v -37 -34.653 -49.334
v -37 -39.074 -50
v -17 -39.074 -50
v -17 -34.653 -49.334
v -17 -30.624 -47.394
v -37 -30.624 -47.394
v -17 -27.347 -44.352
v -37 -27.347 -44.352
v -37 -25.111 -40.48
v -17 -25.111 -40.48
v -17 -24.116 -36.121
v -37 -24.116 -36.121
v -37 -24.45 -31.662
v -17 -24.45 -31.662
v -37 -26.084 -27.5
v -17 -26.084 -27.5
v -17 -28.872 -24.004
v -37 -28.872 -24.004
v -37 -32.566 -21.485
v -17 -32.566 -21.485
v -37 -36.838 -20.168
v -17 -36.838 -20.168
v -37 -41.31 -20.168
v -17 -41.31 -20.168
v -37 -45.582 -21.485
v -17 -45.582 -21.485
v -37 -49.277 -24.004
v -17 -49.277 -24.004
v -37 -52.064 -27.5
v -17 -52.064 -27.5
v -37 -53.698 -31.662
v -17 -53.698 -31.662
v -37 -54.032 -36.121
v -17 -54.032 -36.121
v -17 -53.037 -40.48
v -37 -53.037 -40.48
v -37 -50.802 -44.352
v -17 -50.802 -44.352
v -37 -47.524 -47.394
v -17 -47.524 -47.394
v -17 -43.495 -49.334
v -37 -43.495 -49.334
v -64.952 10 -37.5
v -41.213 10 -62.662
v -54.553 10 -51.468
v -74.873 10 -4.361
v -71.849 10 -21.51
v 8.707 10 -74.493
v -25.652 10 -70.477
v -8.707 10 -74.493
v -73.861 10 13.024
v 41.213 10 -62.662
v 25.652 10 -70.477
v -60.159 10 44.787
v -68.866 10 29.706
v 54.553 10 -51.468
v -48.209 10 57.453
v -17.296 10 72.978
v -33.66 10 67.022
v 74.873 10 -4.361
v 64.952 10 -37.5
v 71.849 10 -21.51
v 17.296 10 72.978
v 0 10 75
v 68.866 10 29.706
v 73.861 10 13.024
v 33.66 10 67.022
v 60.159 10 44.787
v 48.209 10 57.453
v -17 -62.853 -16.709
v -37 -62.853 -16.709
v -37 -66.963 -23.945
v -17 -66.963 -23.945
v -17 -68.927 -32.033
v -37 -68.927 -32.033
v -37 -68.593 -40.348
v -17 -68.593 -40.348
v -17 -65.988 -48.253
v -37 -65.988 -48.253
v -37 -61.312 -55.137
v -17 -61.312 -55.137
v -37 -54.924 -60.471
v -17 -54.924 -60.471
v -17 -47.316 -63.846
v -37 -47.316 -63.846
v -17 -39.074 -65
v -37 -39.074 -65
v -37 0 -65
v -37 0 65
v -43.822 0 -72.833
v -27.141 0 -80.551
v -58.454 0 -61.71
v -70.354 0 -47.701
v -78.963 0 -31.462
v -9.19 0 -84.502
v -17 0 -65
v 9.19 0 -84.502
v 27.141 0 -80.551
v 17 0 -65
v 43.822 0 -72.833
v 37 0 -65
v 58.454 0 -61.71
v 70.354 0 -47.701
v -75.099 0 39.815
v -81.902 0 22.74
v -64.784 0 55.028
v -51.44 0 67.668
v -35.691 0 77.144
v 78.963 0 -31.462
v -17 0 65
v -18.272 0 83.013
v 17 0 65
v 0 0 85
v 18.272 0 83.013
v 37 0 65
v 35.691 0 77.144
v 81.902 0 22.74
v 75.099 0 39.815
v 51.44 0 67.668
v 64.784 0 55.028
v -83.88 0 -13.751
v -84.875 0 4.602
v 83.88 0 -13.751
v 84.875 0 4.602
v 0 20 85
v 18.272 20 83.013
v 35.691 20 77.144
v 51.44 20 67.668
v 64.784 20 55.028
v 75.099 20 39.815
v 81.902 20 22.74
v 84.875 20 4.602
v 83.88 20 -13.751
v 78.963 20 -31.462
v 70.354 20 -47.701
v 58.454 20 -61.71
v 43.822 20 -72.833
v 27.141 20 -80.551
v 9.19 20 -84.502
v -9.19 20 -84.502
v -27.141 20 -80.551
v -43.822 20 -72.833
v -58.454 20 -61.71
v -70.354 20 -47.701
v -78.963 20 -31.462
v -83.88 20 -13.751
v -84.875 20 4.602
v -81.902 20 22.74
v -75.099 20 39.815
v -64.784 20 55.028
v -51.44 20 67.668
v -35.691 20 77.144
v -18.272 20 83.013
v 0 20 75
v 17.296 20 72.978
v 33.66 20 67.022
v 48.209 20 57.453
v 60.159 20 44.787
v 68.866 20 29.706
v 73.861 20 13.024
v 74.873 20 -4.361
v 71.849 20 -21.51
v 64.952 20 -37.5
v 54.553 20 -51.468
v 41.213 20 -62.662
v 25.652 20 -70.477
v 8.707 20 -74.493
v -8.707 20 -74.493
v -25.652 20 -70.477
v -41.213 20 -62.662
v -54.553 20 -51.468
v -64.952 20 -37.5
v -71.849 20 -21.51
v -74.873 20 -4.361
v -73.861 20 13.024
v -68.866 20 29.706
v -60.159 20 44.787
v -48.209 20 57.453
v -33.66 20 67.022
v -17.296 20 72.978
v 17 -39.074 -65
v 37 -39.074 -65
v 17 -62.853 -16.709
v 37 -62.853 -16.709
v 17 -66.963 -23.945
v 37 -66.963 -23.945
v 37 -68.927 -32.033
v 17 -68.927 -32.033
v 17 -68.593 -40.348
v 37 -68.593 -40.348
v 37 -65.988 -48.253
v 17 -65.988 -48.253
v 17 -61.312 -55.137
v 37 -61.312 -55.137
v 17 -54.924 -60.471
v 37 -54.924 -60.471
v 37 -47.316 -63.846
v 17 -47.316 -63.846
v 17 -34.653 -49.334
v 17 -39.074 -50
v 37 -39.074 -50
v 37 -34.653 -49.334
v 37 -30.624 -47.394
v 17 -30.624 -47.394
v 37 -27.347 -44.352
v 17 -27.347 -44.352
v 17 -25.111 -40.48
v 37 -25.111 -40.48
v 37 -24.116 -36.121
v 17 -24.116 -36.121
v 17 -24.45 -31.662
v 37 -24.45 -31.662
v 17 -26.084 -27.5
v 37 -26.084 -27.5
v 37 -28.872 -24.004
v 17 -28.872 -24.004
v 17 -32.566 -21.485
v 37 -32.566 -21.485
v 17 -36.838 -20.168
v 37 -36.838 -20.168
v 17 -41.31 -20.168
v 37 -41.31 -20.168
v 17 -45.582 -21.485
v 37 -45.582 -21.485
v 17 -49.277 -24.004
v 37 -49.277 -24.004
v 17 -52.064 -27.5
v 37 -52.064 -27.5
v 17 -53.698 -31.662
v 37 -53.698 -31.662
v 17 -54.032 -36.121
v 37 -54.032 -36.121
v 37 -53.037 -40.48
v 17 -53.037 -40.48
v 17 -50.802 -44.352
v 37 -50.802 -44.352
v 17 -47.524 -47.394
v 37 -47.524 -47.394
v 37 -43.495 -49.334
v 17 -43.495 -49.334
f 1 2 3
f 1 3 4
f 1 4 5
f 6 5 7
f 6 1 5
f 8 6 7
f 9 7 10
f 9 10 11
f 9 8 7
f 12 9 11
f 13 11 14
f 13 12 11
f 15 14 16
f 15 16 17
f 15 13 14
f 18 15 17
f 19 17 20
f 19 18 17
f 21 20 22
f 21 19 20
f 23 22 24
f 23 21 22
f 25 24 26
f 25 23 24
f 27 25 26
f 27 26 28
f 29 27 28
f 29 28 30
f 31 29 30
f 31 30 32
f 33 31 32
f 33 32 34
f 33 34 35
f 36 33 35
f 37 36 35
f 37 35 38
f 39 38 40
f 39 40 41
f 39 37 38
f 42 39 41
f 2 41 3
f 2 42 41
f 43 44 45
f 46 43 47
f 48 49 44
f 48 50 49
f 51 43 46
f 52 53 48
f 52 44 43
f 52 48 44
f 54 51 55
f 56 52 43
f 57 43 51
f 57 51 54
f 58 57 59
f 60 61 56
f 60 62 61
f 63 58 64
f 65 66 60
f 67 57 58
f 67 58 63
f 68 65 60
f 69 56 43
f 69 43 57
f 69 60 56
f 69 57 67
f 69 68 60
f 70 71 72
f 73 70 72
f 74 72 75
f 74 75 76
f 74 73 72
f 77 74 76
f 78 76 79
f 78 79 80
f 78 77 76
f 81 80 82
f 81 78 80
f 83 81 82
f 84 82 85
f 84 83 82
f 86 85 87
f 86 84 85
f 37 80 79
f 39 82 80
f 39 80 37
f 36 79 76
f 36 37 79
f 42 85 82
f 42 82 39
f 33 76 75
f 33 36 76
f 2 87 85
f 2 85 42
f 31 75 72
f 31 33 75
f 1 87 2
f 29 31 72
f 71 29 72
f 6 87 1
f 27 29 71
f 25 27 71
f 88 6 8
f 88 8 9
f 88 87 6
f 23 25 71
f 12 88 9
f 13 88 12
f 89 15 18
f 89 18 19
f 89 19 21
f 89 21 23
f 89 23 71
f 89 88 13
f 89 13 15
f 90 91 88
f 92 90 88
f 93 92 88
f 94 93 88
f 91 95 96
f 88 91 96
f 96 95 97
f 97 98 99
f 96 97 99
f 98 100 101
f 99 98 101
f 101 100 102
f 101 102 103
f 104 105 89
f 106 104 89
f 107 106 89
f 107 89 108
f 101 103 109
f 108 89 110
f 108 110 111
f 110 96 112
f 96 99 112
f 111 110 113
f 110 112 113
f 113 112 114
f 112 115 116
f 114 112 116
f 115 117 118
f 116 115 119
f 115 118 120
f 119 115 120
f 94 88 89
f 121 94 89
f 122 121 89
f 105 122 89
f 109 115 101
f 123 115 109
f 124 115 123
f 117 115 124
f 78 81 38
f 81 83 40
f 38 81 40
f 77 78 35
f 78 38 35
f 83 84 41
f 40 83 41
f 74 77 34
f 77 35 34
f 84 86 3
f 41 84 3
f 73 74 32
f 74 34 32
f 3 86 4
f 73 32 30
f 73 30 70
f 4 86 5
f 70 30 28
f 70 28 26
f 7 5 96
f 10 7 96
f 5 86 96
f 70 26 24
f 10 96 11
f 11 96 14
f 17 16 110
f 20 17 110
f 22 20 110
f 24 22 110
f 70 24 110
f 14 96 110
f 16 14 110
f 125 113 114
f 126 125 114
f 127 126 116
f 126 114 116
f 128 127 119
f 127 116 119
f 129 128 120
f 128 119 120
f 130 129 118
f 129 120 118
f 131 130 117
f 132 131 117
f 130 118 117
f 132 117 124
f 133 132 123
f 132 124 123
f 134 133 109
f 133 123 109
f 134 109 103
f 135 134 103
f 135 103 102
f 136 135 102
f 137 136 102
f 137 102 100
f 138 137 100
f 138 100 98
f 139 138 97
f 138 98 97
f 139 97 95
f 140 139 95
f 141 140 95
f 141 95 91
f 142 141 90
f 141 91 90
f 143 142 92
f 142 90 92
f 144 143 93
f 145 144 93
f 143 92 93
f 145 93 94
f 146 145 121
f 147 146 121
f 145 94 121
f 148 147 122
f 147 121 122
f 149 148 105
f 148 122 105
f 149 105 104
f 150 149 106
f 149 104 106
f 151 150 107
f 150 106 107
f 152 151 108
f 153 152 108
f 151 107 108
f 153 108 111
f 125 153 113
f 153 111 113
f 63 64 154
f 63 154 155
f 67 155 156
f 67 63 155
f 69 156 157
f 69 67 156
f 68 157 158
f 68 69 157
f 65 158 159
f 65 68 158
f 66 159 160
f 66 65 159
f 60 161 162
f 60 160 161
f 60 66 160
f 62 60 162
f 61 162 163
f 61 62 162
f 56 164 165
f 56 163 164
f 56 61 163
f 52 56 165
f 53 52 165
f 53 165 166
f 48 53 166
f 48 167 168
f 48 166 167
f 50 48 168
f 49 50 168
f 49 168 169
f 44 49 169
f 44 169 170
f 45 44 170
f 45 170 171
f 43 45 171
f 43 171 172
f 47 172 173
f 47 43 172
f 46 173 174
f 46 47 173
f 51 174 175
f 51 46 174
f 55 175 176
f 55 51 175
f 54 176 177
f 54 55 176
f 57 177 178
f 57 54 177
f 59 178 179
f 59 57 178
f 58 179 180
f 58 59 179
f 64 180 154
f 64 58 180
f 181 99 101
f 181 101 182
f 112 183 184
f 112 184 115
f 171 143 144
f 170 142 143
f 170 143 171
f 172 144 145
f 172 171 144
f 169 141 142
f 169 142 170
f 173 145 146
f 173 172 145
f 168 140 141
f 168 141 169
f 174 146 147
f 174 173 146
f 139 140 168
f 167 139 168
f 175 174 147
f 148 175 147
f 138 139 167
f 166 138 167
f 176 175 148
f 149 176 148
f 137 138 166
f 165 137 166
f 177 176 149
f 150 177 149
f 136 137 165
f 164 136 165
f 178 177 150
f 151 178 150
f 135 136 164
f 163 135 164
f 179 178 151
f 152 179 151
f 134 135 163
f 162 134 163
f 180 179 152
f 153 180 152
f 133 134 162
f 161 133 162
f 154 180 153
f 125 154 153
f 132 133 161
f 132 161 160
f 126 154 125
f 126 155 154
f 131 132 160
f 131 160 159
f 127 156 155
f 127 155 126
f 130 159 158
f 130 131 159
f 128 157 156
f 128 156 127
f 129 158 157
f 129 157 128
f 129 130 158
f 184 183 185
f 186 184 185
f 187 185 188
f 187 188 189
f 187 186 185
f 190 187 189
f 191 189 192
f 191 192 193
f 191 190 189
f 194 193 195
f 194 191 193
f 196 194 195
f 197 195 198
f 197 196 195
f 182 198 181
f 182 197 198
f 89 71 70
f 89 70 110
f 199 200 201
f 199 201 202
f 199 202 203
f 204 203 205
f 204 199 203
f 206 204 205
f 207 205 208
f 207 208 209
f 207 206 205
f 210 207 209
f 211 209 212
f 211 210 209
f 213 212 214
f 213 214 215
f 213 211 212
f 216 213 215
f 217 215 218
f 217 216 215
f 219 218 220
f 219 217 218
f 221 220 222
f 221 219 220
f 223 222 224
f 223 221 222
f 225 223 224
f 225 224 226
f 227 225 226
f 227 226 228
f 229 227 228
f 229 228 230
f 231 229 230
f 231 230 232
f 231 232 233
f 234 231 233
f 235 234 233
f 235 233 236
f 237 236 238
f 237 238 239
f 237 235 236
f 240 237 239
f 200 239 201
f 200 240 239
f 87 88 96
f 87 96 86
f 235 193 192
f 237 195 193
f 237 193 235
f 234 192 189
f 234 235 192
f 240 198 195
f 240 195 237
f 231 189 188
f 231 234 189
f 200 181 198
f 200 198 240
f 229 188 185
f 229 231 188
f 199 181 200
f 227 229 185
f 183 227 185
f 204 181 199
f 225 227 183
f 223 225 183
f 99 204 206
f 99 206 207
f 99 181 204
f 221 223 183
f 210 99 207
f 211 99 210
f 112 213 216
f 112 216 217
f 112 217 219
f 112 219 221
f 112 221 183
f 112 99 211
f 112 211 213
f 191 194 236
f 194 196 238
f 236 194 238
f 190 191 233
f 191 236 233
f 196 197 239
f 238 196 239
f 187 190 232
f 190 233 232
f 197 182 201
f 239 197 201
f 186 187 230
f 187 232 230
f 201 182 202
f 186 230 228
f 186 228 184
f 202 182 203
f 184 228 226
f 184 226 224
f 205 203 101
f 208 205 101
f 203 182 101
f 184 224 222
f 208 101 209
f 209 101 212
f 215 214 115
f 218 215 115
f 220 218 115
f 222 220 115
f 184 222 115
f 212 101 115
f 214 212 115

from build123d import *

# Parameters (mm, degrees)
CONNECTOR_PLATE_SKETCH_R      = 85
CONNECTOR_PLATE_EXTRUDE_DEPTH = 20
CONNECTOR_PLATE_SHELL_T       = -10
TRIANGLE_START                = 17
TRIANGLE_SKETCH_R             = 15
TRIANGLE_EXTRUDE_1_DEPTH      = 20
TRIANGLE_START_2              = -37
TRIANGLE_SKETCH_3_R           = 15
TRIANGLE_EXTRUDE_2_DEPTH      = 20
TRIANGLE_FILLET_R             = 30


with BuildPart() as part:
    # Connector Plate Sketch → Connector Plate Extrude (new body)
    with BuildSketch(Plane(origin=(0, 0, 0), x_dir=(1, 0, 0), z_dir=(0, 1, 0))):
        Circle(CONNECTOR_PLATE_SKETCH_R)
    extrude(amount=CONNECTOR_PLATE_EXTRUDE_DEPTH)

    # Connector Plate Shell
    connector_plate_shell_openings = [part.faces().sort_by_distance(p)[0] for p in [
        (0, 20, 0),
    ]]
    offset(amount=CONNECTOR_PLATE_SHELL_T, openings=connector_plate_shell_openings, kind=Kind.INTERSECTION)

    # Triangle Sketch → Triangle Extrude 1 (add)
    with BuildSketch(Plane(origin=(0, 0, 0), x_dir=(0, 0, -1), z_dir=(1, 0, 0)).offset(TRIANGLE_START)):
        Polygon((65, -100), (-65, 0), (65, 0), align=None)
        with Locations((35, -39.074108923)):
            Circle(TRIANGLE_SKETCH_R, mode=Mode.SUBTRACT)
    extrude(amount=TRIANGLE_EXTRUDE_1_DEPTH)

    # Triangle Sketch<3> → Triangle Extrude 2 (add)
    with BuildSketch(Plane(origin=(0, 0, 0), x_dir=(0, 0, -1), z_dir=(1, 0, 0)).offset(TRIANGLE_START_2)):
        Polygon((65, -100), (-65, 0), (65, 0), align=None)
        with Locations((35, -39.074108923)):
            Circle(TRIANGLE_SKETCH_3_R, mode=Mode.SUBTRACT)
    extrude(amount=TRIANGLE_EXTRUDE_2_DEPTH)

    # Triangle Fillet
    triangle_fillet_edges = [part.edges().sort_by_distance(p)[0] for p in [
        (27, -100, -65),
        (-27, -100, -65),
    ]]
    fillet(triangle_fillet_edges, radius=TRIANGLE_FILLET_R)


solid = part.part
